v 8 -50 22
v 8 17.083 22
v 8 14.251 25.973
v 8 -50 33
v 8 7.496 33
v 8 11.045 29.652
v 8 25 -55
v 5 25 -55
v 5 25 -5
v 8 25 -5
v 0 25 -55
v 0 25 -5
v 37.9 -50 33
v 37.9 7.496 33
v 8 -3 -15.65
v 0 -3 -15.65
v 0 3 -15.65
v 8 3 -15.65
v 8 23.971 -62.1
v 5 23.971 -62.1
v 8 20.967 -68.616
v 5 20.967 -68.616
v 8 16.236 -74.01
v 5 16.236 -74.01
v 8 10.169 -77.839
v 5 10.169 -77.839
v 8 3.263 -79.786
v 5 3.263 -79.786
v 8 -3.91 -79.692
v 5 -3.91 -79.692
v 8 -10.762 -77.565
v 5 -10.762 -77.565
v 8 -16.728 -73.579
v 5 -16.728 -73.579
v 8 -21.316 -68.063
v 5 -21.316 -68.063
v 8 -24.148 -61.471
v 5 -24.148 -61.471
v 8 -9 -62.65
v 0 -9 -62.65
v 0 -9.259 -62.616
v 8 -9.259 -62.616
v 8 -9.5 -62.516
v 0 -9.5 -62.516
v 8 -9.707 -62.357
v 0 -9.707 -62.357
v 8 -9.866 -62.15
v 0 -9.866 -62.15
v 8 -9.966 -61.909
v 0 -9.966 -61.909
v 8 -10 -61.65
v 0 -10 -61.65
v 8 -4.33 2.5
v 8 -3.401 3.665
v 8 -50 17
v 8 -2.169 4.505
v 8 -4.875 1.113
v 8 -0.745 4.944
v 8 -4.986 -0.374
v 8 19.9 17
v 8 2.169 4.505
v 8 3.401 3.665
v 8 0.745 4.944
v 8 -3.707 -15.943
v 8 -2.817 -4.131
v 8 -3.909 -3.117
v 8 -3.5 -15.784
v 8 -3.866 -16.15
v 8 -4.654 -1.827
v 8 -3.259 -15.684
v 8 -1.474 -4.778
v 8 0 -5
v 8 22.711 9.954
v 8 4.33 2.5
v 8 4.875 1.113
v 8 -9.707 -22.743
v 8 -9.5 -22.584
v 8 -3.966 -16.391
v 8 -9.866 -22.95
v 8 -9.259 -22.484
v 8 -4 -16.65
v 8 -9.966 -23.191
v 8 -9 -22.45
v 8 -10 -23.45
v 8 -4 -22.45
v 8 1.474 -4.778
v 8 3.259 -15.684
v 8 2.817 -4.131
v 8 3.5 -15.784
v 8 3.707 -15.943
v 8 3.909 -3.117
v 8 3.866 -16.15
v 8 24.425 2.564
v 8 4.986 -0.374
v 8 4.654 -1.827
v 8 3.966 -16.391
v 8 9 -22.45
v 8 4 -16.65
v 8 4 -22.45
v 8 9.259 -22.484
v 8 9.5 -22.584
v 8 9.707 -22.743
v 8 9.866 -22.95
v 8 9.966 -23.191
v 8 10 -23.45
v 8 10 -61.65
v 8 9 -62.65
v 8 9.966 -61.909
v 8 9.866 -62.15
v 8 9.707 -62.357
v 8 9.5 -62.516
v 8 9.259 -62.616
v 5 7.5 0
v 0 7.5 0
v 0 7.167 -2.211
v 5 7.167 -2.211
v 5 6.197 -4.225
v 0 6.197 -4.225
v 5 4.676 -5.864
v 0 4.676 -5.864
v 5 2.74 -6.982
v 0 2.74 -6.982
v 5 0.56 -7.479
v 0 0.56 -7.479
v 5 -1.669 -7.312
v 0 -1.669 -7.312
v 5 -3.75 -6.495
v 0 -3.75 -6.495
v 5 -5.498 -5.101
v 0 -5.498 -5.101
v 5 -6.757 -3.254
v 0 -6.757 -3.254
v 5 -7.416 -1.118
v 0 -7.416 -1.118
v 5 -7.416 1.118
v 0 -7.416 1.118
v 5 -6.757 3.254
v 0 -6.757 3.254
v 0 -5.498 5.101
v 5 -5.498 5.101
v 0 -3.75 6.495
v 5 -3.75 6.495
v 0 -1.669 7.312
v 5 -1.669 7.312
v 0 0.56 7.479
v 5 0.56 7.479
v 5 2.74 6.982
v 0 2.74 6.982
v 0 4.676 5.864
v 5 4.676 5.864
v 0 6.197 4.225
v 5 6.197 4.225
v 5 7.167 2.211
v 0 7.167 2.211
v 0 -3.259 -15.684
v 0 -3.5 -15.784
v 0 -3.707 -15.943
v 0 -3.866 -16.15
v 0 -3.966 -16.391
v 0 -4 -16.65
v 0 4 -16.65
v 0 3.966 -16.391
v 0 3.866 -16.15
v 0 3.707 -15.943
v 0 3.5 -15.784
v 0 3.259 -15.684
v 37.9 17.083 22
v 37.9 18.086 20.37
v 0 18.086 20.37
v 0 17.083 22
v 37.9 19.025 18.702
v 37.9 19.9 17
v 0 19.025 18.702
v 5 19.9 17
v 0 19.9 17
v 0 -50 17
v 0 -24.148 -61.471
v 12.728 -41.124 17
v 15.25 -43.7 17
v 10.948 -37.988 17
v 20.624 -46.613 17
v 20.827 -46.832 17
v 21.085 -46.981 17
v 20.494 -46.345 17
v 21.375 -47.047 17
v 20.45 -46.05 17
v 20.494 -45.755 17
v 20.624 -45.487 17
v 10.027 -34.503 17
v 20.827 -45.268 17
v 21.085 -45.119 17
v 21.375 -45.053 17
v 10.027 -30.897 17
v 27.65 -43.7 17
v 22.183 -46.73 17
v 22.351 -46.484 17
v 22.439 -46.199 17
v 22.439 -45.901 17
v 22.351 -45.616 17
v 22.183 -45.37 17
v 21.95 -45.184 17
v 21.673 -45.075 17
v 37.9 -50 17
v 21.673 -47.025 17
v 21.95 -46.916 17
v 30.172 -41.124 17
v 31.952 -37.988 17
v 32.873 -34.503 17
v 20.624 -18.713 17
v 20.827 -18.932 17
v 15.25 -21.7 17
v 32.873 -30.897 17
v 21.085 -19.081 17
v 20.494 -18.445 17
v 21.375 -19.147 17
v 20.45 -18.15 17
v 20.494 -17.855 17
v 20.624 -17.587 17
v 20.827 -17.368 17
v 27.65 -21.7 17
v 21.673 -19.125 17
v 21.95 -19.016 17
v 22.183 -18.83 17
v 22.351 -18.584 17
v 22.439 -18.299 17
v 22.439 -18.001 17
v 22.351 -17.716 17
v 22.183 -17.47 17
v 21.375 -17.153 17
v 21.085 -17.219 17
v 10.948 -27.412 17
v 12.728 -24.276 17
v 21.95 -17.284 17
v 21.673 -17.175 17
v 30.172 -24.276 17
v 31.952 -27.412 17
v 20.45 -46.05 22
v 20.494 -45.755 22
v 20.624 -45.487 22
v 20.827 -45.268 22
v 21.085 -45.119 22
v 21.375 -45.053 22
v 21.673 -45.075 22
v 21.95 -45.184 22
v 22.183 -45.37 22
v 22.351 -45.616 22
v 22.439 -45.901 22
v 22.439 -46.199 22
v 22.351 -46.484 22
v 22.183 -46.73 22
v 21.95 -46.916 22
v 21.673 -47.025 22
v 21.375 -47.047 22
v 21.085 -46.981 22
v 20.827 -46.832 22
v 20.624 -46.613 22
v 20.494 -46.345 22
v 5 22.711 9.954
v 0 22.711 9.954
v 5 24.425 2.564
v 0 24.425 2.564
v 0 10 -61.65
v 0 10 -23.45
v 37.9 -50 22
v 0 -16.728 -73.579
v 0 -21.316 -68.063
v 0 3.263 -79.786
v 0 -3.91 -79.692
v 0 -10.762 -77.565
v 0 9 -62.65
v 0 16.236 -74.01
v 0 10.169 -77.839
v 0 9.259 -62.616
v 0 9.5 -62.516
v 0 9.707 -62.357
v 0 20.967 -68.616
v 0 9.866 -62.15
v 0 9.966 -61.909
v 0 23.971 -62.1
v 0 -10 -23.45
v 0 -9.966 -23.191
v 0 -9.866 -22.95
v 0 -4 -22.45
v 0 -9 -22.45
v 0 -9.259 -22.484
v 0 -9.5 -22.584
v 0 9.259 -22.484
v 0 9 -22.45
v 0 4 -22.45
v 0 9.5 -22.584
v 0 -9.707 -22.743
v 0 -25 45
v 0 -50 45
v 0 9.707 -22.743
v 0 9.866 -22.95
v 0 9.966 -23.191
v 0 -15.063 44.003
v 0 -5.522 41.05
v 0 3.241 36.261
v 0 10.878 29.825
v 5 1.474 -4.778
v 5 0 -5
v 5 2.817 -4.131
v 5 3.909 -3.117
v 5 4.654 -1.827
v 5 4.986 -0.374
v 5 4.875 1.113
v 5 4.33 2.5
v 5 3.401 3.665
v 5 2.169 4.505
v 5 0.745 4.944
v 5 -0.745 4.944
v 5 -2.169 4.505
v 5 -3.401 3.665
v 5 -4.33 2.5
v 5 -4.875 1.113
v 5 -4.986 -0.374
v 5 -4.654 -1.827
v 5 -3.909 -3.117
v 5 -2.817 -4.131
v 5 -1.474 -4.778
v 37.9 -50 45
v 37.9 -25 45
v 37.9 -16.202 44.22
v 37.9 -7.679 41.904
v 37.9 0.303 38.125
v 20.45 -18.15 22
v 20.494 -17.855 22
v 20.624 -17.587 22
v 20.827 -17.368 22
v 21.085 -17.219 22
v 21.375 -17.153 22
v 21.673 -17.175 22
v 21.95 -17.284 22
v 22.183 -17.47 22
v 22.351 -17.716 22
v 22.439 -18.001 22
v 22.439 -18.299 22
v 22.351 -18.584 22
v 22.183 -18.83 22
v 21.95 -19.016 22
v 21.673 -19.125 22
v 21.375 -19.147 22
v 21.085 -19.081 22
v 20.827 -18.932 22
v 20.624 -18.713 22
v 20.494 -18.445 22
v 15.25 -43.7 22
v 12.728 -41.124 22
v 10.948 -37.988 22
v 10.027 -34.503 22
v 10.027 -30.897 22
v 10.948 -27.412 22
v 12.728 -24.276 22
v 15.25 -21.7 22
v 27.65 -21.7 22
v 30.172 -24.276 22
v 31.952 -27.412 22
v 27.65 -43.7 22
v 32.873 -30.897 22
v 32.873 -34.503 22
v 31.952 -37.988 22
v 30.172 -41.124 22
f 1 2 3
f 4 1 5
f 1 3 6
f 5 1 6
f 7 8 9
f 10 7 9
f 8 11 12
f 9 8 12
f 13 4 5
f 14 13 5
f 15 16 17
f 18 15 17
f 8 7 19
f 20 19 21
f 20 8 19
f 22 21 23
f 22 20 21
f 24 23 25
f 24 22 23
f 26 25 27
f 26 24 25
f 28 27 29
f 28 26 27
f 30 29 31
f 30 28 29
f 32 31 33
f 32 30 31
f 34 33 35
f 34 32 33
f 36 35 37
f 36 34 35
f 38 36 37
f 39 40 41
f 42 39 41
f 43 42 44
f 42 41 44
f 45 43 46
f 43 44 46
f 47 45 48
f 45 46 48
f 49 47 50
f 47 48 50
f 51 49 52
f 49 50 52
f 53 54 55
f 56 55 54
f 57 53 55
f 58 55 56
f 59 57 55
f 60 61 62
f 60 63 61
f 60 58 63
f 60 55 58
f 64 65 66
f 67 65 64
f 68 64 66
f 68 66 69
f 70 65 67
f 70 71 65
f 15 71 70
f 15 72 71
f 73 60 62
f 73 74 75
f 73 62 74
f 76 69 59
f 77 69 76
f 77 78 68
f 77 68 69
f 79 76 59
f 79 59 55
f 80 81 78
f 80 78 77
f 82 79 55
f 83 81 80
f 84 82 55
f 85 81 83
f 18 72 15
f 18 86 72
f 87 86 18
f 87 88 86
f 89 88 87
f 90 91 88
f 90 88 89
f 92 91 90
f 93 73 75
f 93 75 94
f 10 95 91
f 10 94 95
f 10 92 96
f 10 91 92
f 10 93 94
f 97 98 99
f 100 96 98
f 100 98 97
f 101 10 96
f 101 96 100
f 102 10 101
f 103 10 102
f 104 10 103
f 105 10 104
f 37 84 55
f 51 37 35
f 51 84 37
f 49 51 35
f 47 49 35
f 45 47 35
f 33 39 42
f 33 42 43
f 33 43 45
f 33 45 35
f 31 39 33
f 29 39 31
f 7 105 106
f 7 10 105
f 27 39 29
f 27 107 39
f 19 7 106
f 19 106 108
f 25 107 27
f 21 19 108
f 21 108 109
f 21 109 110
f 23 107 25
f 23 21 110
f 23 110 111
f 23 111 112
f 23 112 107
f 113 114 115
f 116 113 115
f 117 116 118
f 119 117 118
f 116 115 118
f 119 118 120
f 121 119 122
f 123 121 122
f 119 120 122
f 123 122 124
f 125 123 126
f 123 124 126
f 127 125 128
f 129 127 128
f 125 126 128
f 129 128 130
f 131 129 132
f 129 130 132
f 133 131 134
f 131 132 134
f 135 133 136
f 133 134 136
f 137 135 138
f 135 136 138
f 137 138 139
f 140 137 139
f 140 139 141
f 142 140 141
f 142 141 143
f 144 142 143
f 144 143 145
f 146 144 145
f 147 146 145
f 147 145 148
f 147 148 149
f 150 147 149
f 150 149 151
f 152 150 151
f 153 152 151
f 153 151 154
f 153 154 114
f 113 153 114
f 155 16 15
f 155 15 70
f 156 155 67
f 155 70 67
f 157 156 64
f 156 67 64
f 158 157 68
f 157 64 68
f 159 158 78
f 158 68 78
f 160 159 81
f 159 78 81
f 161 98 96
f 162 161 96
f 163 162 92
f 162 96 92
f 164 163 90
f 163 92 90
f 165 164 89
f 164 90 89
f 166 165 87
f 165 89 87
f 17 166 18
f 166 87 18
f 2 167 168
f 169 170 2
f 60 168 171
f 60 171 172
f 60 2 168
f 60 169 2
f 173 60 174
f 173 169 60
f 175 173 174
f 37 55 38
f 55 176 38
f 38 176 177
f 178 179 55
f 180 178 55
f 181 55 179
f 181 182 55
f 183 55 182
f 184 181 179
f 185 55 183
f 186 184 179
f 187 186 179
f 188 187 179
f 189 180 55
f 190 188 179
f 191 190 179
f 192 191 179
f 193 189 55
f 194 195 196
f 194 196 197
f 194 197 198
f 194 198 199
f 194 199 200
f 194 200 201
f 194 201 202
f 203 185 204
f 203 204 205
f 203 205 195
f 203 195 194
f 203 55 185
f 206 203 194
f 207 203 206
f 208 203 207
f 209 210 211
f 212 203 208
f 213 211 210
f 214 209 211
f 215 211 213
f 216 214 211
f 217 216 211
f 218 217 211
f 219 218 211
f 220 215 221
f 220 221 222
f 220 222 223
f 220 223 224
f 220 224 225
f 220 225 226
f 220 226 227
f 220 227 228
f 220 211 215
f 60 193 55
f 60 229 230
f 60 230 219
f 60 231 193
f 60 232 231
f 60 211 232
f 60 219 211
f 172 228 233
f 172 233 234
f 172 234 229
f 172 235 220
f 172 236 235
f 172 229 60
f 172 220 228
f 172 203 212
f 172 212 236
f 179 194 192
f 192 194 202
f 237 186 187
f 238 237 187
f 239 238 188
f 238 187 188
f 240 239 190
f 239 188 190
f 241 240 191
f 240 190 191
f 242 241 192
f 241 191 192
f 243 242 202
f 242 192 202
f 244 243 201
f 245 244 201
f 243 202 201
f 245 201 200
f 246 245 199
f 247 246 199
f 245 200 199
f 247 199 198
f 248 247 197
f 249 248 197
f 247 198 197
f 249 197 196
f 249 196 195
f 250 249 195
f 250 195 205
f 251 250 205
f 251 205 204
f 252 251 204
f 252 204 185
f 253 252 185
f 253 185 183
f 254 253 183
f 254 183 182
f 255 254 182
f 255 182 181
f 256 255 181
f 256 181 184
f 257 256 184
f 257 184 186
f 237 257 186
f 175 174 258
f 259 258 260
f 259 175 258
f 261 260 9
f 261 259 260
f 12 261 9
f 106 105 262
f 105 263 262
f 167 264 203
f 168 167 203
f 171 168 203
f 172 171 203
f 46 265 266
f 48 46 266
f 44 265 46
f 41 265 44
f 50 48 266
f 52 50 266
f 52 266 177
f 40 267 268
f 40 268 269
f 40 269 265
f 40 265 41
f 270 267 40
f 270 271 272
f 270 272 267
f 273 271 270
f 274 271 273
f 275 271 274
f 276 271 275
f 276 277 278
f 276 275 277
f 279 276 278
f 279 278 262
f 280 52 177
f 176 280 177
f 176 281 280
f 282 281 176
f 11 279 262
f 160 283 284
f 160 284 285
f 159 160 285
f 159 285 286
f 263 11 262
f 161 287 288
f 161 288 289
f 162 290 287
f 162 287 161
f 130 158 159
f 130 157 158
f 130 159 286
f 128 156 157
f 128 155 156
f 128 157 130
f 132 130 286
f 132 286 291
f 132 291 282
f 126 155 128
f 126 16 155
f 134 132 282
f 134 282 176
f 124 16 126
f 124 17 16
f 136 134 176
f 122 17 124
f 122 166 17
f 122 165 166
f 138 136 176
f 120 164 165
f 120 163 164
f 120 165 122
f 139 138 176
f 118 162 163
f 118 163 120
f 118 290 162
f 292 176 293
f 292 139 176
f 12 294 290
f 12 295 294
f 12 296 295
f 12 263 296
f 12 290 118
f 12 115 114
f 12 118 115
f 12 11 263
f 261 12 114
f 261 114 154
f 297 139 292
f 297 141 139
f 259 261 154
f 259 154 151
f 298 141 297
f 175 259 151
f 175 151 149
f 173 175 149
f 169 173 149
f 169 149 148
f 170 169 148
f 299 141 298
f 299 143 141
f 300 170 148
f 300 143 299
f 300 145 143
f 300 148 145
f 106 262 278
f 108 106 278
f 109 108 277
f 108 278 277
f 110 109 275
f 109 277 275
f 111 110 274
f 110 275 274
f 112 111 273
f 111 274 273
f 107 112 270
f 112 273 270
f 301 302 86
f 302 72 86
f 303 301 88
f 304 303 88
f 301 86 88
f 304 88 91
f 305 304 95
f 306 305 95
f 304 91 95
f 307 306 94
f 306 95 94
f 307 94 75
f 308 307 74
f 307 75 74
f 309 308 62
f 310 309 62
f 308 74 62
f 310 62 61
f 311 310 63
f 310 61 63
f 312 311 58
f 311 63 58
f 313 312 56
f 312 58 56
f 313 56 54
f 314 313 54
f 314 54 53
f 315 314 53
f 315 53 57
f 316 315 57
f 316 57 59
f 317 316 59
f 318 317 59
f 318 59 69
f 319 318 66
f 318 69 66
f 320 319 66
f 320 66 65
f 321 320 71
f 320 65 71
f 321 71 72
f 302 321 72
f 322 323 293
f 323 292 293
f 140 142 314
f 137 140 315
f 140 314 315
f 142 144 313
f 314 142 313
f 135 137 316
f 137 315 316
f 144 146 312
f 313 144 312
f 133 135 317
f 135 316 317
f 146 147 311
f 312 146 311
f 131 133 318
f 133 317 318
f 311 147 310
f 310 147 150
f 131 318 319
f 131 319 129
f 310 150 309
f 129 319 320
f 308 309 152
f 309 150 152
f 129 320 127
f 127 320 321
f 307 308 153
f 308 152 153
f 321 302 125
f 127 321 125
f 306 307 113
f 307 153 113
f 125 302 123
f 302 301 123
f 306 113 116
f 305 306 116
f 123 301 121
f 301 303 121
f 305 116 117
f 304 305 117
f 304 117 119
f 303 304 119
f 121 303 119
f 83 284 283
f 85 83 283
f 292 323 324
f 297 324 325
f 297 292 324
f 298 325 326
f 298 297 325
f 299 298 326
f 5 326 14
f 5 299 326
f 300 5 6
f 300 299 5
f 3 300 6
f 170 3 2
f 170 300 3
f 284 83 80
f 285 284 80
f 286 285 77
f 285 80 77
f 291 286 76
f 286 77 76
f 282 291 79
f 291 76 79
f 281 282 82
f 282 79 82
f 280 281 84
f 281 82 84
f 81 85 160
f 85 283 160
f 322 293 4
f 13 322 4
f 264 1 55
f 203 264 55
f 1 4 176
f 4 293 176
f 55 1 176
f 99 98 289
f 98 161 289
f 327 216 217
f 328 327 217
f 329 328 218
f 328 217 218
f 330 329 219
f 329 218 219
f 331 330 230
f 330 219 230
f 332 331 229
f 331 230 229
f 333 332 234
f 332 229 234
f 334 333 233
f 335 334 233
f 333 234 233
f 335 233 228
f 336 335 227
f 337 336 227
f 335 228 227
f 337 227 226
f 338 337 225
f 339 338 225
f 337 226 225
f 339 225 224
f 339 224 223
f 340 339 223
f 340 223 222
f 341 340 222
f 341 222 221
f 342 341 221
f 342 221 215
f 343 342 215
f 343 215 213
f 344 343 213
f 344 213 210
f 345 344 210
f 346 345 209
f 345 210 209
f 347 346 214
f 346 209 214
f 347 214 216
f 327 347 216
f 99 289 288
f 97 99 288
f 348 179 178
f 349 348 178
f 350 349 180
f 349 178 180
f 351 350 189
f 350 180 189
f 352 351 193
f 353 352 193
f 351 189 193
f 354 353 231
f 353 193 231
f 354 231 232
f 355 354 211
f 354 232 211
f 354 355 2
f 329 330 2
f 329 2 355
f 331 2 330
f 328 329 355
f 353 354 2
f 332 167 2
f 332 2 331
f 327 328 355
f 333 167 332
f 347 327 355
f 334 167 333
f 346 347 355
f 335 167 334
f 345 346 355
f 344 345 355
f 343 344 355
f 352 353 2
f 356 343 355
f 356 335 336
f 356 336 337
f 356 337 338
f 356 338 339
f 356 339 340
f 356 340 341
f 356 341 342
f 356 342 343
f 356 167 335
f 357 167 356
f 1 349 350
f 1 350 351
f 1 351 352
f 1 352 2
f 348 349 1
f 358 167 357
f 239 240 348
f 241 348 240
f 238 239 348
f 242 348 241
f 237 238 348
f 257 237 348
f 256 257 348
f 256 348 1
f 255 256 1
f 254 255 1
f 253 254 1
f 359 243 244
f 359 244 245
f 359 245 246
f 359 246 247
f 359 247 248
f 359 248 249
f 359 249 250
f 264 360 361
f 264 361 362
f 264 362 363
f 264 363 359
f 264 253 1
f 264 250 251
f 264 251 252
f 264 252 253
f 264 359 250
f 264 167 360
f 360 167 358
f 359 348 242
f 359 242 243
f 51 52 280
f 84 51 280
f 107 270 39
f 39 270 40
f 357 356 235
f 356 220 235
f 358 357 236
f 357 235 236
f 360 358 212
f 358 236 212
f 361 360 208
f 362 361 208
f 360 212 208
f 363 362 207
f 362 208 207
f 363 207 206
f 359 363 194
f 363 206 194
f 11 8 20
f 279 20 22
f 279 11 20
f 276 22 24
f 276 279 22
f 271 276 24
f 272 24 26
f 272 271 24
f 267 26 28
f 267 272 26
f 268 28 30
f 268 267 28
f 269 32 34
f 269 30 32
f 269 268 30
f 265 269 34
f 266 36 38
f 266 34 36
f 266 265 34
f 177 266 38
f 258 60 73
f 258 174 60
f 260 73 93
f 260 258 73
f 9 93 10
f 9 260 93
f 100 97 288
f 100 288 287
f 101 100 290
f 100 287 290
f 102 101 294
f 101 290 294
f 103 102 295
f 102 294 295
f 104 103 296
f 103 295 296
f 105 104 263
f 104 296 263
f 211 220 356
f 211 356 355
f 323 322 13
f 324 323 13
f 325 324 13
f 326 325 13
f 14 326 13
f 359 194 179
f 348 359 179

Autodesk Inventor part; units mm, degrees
ref_plane "YZ Plane" through (0, 0, 0) normal (1, 0, 0) x (0, 1, 0)
ref_plane "XZ Plane" through (0, 0, 0) normal (0, 1, 0) x (-1, 0, 0)
ref_plane "XY Plane" through (0, 0, 0) normal (0, 0, 1) x (1, 0, 0)
sketch "Sketch1" plane through (0, 0, 0) normal (1, 0, 0) x (0, 1, 0)
  circle A0 centre (0, 0) radius 16.575
  line L0 (0, 16.575) -> (0, -49.725)
  line L1 (0, -33.15) -> (0, -15.05)
  line L2 (0, -15.05) -> (0, -70.05)
  line L3 (10, -70.05) -> (-10, -70.05)
  line L4 (-10, -70.05) -> (-10, -15.05)
  line L5 (-10, -15.05) -> (10, -15.05)
  line L6 (10, -15.05) -> (10, -70.05)
  line L7 (10, -70.05) -> (-10, -15.05) construction
  line L8 (-10, -70.05) -> (10, -15.05) construction
  line L9 (10, -62.65) -> (-10, -62.65)
  line L10 (-10, -62.65) -> (-10, -22.45)
  line L11 (-10, -22.45) -> (10, -22.45)
  line L12 (10, -22.45) -> (10, -62.65)
  line L13 (10, -62.65) -> (-10, -22.45) construction
  line L14 (-10, -62.65) -> (10, -22.45) construction
  line L15 (-4.95, -27.2) -> (-4.95, -17.7)
  line L16 (-4.95, -17.7) -> (4.95, -17.7)
  line L17 (4.95, -27.2) -> (-4.95, -17.7) construction
  line L18 (-4.95, -27.2) -> (4.95, -17.7) construction
  line L19 (4.95, -67.4) -> (-4.95, -67.4)
  line L20 (-4.95, -67.4) -> (-4.95, -57.9)
  line L21 (-4.95, -57.9) -> (4.95, -57.9)
  line L22 (4.95, -67.4) -> (-4.95, -57.9) construction
  line L23 (-4.95, -67.4) -> (4.95, -57.9) construction
  circle A1 centre (4.95, -17.7) radius 1.5
  circle A2 centre (-4.95, -17.7) radius 1.5
  circle A3 centre (4.95, -67.4) radius 1.5
  circle A4 centre (-4.95, -67.4) radius 1.5
  circle A5 centre (0, -33.15) radius 6.8
  line L24 (0, -80) -> (0, -55)
  arc A6 (-25, -55) -> (25, -55) centre (0, -55) ccw
  line L25 (0, 0) -> (0, 45)
  line L26 (25, 45) -> (-25, 45)
  line L27 (25, 45) -> (25, -55)
  line L28 (-25, 45) -> (-25, -55)
  circle A7 centre (0, 0) radius 7.5
  point P0 (0, -42.55)
  point P1 (0, -42.55)
  point P2 (0, -22.45)
  point P3 (0, -62.65)
  dimension "d0" = 33.15
  dimension "d2" = 66.3
  dimension "d4" = 18.1
  dimension "d5" = 55
  dimension "d6" = 20
  dimension "d7" = 55
  dimension "d8" = 40.2
  dimension "d9" = 9.9
  dimension "d10" = 9.5
  dimension "d11" = 9.9
  dimension "d12" = 9.5
  dimension "d13" = 3
  dimension "d14" = 3
  dimension "d15" = 3
  dimension "d16" = 3
  dimension "d17" = 13.6
  dimension "d20" = 25
  dimension "d21" = 45
  dimension "d22" = 15
extrude "Extrusion1" add sketch "Sketch1" along normal blind 5 contours A0 L5 L0 A7 | A0 L25 L26 L27 A6 L24 L3 L6 L5 | L0 A7 L5 A0 | A0 L5 L4 L3 L24 A6 L28 L26 L25 | L5 L6 L11 L0 A0 | A0 L0 L5 | L5 L0 A0 | A0 L0 L16 A2 L15 L11 L4 L5 | L0 L11 L15 A2 L16 | L6 L9 L2 L0 A5 L11 | L11 L0 A5 L2 L21 L20 L9 L4 | L6 L3 L2 L9 | L9 L20 A4 L19 L2 L3 L4 | L9 L20 L21 L2 | L2 L19 A4 L20 L9
sketch "Sketch2" plane through (5, 0, 0) normal (1, 0, 0) x (0, 0, -1)
  line L0 (-45, -25) -> (55, -25) projected
  circle A0 centre (33.15, 0) radius 6.8 projected
  line L1 (33.15, 0) -> (15.05, 0)
  line L2 (15.05, 0) -> (70.05, 0)
  line L3 (62.65, 10) -> (22.45, 10)
  line L4 (22.45, 10) -> (22.45, -10)
  line L5 (22.45, -10) -> (62.65, -10)
  line L6 (62.65, -10) -> (62.65, 10)
  line L7 (62.65, 10) -> (22.45, -10) construction
  line L8 (22.45, 10) -> (62.65, -10) construction
  point P0 (42.55, 0)
  dimension "d25" = 18.1
  dimension "d26" = 55
  dimension "d27" = 40.2
  dimension "d28" = 20
extrude "Extrusion2" cut sketch "Sketch2" against normal blind 5 contours L2 L6 L5 L4 L1 A0 | A0 L1 L4 L3 L6 L2
sketch "Sketch3" plane through (5, 0, 0) normal (1, 0, 0) x (0, 0, -1)
  circle A0 centre (17.7, 4.95) radius 1.5 projected
  circle A1 centre (17.7, -4.95) radius 1.5 projected
  circle A2 centre (67.4, 4.95) radius 1.5 projected
  circle A3 centre (67.4, -4.95) radius 1.5 projected
extrude "Extrusion3" add sketch "Sketch3" against normal blind 5
sketch "Sketch4" plane through (5, 0, 0) normal (1, 0, 0) x (0, 0, -1)
  line L0 (55, 25) -> (-45, 25) projected
  line L1 (-45, 25) -> (-45, -25) projected
  line L2 (-45, -25) -> (55, -25) projected
  line L3 (-45, 25) -> (-35, 25)
  line L4 (-35, 25) -> (-35, -25)
  line L5 (-35, -25) -> (-45, -25)
  line L6 (-45, -25) -> (-45, 25)
  dimension "d33" = 10
extrude "Extrusion4" add sketch "Sketch4" along normal blind 32.9
sketch "Sketch5" plane through (0, -25, -55) normal (0, -1, 0) x (1, 0, 0)
  line L0 (5, 90) -> (37.9, 90)
  line L1 (37.9, 90) -> (37.9, 100)
  line L2 (37.9, 100) -> (5, 100)
  line L3 (5, 100) -> (5, 90)
  point P0 (0, 55)
extrude "Extrusion5" add sketch "Sketch5" along normal blind 25
sketch "Sketch6" plane through (0, 0, 0) normal (-1, 0, 0) x (0, 0, 1)
  arc A0 (-55, 25) -> (-55, -25) centre (-55, 0) ccw projected
  line L0 (45, -25) -> (-55, -25) projected
  line L1 (-55, 25) -> (45, 25) projected
  line L2 (45, -25) -> (45, -50)
  line L3 (45, -50) -> (35, -50)
  line L4 (35, -50) -> (-61.4711, -24.148)
  line L5 (-55, -25) -> (45, -25)
  arc A1 (-61.4711, -24.148) -> (-55, -25) centre (-55, 0) ccw
  dimension "d38" = 25
  dimension "d39" = 10
extrude "Extrusion6" add sketch "Sketch6" against normal blind 5
sketch "Sketch7" plane through (0, 25, 45) normal (0, 0, 1) x (1, 0, 0)
  line L0 (37.9, -75) -> (0, -75) projected
  line L1 (0, 0) -> (37.9, 0) projected
  line L2 (18.95, -75) -> (18.95, -62.5)
  circle A0 centre (18.95, -62.5) radius 7.5
  point P0 (0, -25)
  dimension "d42" = 12.5
  dimension "d43" = 15
extrude "Extrusion7" cut sketch "Sketch7" against normal blind 10
sketch "Sketch8" plane through (5, 0, 0) normal (1, 0, 0) x (0, 0, -1)
  line L0 (-35, 25) -> (-35, -50) projected
  line L1 (55, 25) -> (-35, 25) projected
  line L2 (-35, -50) -> (-35, 25)
  line L3 (-35, -50) -> (-17, -50)
  line L4 (-17, -50) -> (-17, 25)
  line L5 (-17, -50) -> (61.4711, -24.148)
  line L6 (-17, -50) -> (-22, -50)
  line L7 (-22, -50) -> (-22, 25)
  line L8 (-17, 25) -> (-22, 25)
  dimension "d46" = 18
  dimension "d47" = 5
extrude "Extrusion8" add sketch "Sketch8" along normal blind 32.9 contours L1 L4 L3 L7
sketch "Sketch9" plane through (0, 0, 0) normal (-1, 0, 0) x (0, 0, 1)
  line L0 (-61.4711, -24.148) -> (35, -50) projected
  arc A0 (-55, 25) -> (-61.4711, -24.148) centre (-55, 0) ccw projected
  line L1 (17, -50) -> (-61.4711, -24.148)
  line L2 (-61.4711, -24.148) -> (35, -50)
  line L3 (35, -50) -> (17, -50)
  line L4 (35, -50) -> (17, -50)
  line L5 (17, -50) -> (-61.4711, -24.148)
  line L6 (-61.4711, -24.148) -> (35, -50)
  point P0 (45, -50)
  dimension "d50" = 28
extrude "Extrusion9" add sketch "Sketch9" against normal blind 5
sketch "Sketch11" plane through (0, 25, 45) normal (0, 0, 1) x (1, 0, 0)
  circle A0 centre (18.95, -62.5) radius 7.5 projected
  point P0 (0, -25)
extrude "Extrusion10" add sketch "Sketch11" against normal blind 10
sketch "Sketch12" plane through (0, 25, 45) normal (0, 0, 1) x (1, 0, 0)
  line L0 (37.9, -75) -> (0, -75) projected
  line L1 (0, -75) -> (5, -75)
  line L2 (37.9, -75) -> (5, -75)
  line L3 (21.45, -75) -> (21.45, -62.5)
  circle A0 centre (21.45, -62.5) radius 6.8
  point P0 (0, -25)
  dimension "d55" = 5
  dimension "d56" = 12.5
  dimension "d57" = 13.6
extrude "Extrusion11" cut sketch "Sketch12" against normal blind 10
sketch "Sketch13" plane through (37.9, 25, 17) normal (0, 0, -1) x (-1, 0, 0)
  line L0 (32.9, -75) -> (0, -75) projected
  line L1 (16.45, -75) -> (16.45, -62.5)
  circle A0 centre (16.45, -62.5) radius 6.2
  line L2 (16.45, -62.5) -> (16.45, -50.3)
  circle A1 centre (16.45, -56.4) radius 3.1
  point P0 (37.9, -25)
  dimension "d60" = 12.5
  dimension "d61" = 12.4
  dimension "d62" = 12.2
  dimension "d63" = 6.2
extrude "Extrusion12" cut sketch "Sketch13" against normal blind 5
sketch "Sketch15" plane through (37.9, 25, 17) normal (0, 0, -1) x (-1, 0, 0)
  arc A0 (13.4271, -57.0869) -> (19.4729, -57.0869) centre (16.45, -62.5) ccw projected
  line L0 (32.9, -75) -> (0, -75) projected
  line L1 (16.45, -62.5) -> (16.45, -73.1)
  circle A1 centre (16.45, -73.1) radius 1
  line L2 (16.45, -62.5) -> (16.45, -41.1)
  circle A2 centre (16.45, -41.1) radius 1
  point P0 (37.9, -25)
  dimension "d66" = 10.6
  dimension "d67" = 2
  dimension "d68" = 21.4
  dimension "d69" = 2
extrude "Extrusion13" cut sketch "Sketch15" against normal blind 5
sketch "Sketch16" plane through (37.9, 25, 17) normal (0, 0, -1) x (-1, 0, 0)
  circle A0 centre (16.45, -73.1) radius 1 projected
  circle A1 centre (16.45, -41.1) radius 1 projected
  line L0 (32.9, -75) -> (0, -75) projected
  line L1 (16.45, -41.1) -> (16.45, -43.15)
  line L2 (16.45, -73.1) -> (16.45, -71.05)
  point P0 (37.9, -25)
  dimension "d72" = 2.05
  dimension "d73" = 2.05
extrude "Extrusion14" add sketch "Sketch16" against normal blind 5
sketch "Sketch17" plane through (37.9, 25, 17) normal (0, 0, -1) x (-1, 0, 0)
  arc A0 (13.4271, -57.0869) -> (19.4729, -57.0869) centre (16.45, -62.5) ccw projected
  line L0 (32.9, -75) -> (0, -75) projected
  line L1 (16.45, -62.5) -> (16.45, -41.1)
  line L2 (16.45, -41.1) -> (16.45, -43.15)
  circle A1 centre (16.45, -43.15) radius 1
  line L3 (16.45, -62.5) -> (16.45, -73.1)
  line L4 (16.45, -73.1) -> (16.45, -71.05)
  circle A2 centre (16.45, -71.05) radius 1
  point P0 (37.9, -25)
  dimension "d76" = 21.4
  dimension "d77" = 2.05
  dimension "d78" = 2
  dimension "d79" = 10.6
  dimension "d80" = 2.05
  dimension "d81" = 2
extrude "Extrusion15" cut sketch "Sketch17" against normal blind 5
sketch "Sketch18" plane through (0, 0, 0) normal (-1, 0, 0) x (0, 0, 1)
  line L0 (45, 25) -> (45, -50) projected
  line L1 (-55, 25) -> (45, 25) projected
  line L2 (45, 25) -> (45, -20)
  line L3 (45, 25) -> (0, 25)
  line L4 (0, 25) -> (-5, 25)
  line L5 (45, -20) -> (45, -25)
  arc A0 (45, -25) -> (-5, 25) centre (-5, -25) ccw
  dimension "d84" = 45
  dimension "d86" = 5
  dimension "d87" = 5
extrude "Extrusion16" cut sketch "Sketch18" against normal blind 39
sketch "Sketch19" plane through (37.9, -50, 17) normal (0, 0, -1) x (-1, 0, 0)
  line L0 (32.9, 0) -> (32.9, 69.8999) projected
  arc A0 (13.4271, 17.9131) -> (19.4729, 17.9131) centre (16.45, 12.5) ccw projected
  arc A1 (19.4729, 17.9131) -> (13.4271, 17.9131) centre (16.45, 18.6) ccw projected
  line L1 (0, 25) -> (0, 0) projected
  line L2 (0, 6.3) -> (32.9, 6.3)
  line L3 (0, 6.3) -> (0, 28.3)
  line L4 (0, 55) -> (0, 25) projected
  line L5 (0, 28.3) -> (32.9, 28.3)
  line L6 (32.9, 28.3) -> (32.9, 6.3)
  point P0 (37.9, 50)
  dimension "d90" = 22
extrude "Extrusion17" cut sketch "Sketch19" against normal blind 5
sketch "Sketch21" plane through (5, 0, 0) normal (1, 0, 0) x (0, 0, -1)
  line L0 (22.45, -10) -> (22.45, 10) projected
  line L1 (22.45, 10) -> (62.65, 10) projected
  line L2 (62.65, 10) -> (62.65, -10) projected
  line L3 (62.65, -10) -> (22.45, -10) projected
  circle A0 centre (0, 0) radius 7.5 projected
  arc A1 (-22, 17.0833) -> (-35, 5) centre (5, -25) ccw projected
  line L4 (-35, 5) -> (-35, -50) projected
  line L5 (-35, -50) -> (-22, -50) projected
  line L6 (-22, -43.7) -> (-22, -50) projected
  line L7 (-17, -43.7) -> (-22, -43.7) projected
  line L8 (-17, -50) -> (-17, -43.7) projected
  line L9 (-17, -50) -> (61.4711, -24.148) projected
  arc A2 (61.4711, -24.148) -> (55, 25) centre (55, 0) ccw projected
  line L10 (55, 25) -> (5, 25) projected
  arc A3 (5, 25) -> (-17, 19.8999) centre (5, -25) ccw projected
  line L11 (-17, -21.7) -> (-17, 19.8999) projected
  line L12 (-17, -21.7) -> (-22, -21.7) projected
  line L13 (-22, 17.0833) -> (-22, -21.7) projected
extrude "Extrusion18" add sketch "Sketch21" along normal blind 3
sketch "Sketch22" plane through (0, -50, 45) normal (0, 0, 1) x (1, 0, 0)
  circle A0 centre (21.45, 12.5) radius 6.8 projected
  circle A1 centre (21.45, 12.5) radius 5
  point P0 (0, 50)
  dimension "d95" = 10
extrude "Extrusion19" add sketch "Sketch22" against normal blind 2
sketch "Sketch23" plane through (37.9, -50, 35) normal (0, 0, -1) x (-1, 0, 0)
  circle A0 centre (16.45, 12.5) radius 6.8 projected
  line L0 (29.9, 0) -> (29.9, 55) projected
  line L1 (29.9, 55) -> (0, 55) projected
  line L2 (0, 55) -> (0, 0) projected
  line L3 (29.9, 0) -> (0, 0) projected
  point P0 (37.9, 50)
extrude "Extrusion20" add sketch "Sketch23" along normal blind 2
sketch "Sketch24" plane through (37.9, -21.7, 17) normal (0, -1, 0) x (1, 0, 0)
  line L0 (-29.9, 5) -> (0, 5) projected
  line L1 (0, 0) -> (-10.25, 0)
  line L2 (-10.25, 0) -> (-10.25, 5)
  line L3 (-10.25, 5) -> (0, 5)
  line L4 (0, 5) -> (0, 0)
  line L5 (-29.9, 0) -> (-22.65, 0)
  line L6 (-22.65, 0) -> (-22.65, 5)
  line L7 (-22.65, 5) -> (-29.9, 5)
  line L8 (-29.9, 5) -> (-29.9, 0)
  point P0 (-37.9, -17)
  dimension "d100" = 10.25
  dimension "d101" = 7.25
extrude "Extrusion21" add sketch "Sketch24" along normal blind 22
sketch "Sketch25" plane through (37.9, -50, 33) normal (0, 0, -1) x (-1, 0, 0)
  circle A0 centre (16.45, 12.5) radius 6.8 projected
  circle A1 centre (16.45, 12.5) radius 5
  point P0 (37.9, 50)
  dimension "d104" = 10
extrude "Extrusion22" add sketch "Sketch25" against normal blind 2
sketch "Sketch26" plane through (8, 0, 0) normal (1, 0, 0) x (0, 0, -1)
  circle A0 centre (0, 0) radius 7.5 projected
  circle A1 centre (0, 0) radius 5
  dimension "d107" = 10
extrude "Extrusion23" add sketch "Sketch26" against normal blind 3
sketch "Sketch28" plane through (37.9, -50, 17) normal (0, 0, -1) x (-1, 0, 0)
  line L0 (10.25, 28.3) -> (10.25, 6.3) projected
  line L1 (22.65, 28.3) -> (22.65, 6.3) projected
  arc A0 (22.65, 6.3) -> (22.65, 28.3) centre (13.9897, 17.3) ccw
  arc A1 (10.25, 28.3) -> (10.25, 6.3) centre (18.9103, 17.3) ccw
  point P0 (37.9, 50)
  dimension "d111" = 14
  dimension "d112" = 14
extrude "Extrusion24" cut sketch "Sketch28" against normal blind 5
sketch "Sketch29" plane through (37.9, 0, 0) normal (1, 0, 0) x (0, 0, -1)
  arc A0 (-35, 5) -> (-45, -25) centre (5, -25) ccw projected
  line L0 (-45, -25) -> (-45, -50) projected
  line L1 (-45, -50) -> (-33, -50) projected
  line L2 (-33, 5) -> (-33, -50) projected
  line L3 (-35, 5) -> (-33, 5) projected
  point P0 (0, 0)
extrude "Extrusion25" cut sketch "Sketch29" against normal blind 29.9
sketch "Sketch30" plane through (0, -50, -55) normal (0, -1, 0) x (1, 0, 0)
  line L0 (8, 100) -> (8, 77) projected
  line L1 (8, 100) -> (0, 100) projected
  line L2 (0, 72) -> (0, 100) projected
  line L3 (8, 77) -> (0, 77)
  point P0 (0, 55)
extrude "Extrusion26" cut sketch "Sketch30" against normal blind 70
sketch "Sketch31" plane through (37.9, 0, 0) normal (1, 0, 0) x (0, 0, -1)
  line L0 (-17, -50) -> (-17, 19.8999) projected
  arc A0 (-17, 19.8999) -> (-22, 17.0833) centre (5, -25) ccw projected
  line L1 (-17, -50) -> (-17, 18)
  line L2 (-17, 18) -> (-17, 20)
  line L3 (-17, 20) -> (-22, 20)
  line L4 (-22, 20) -> (-22, 17.0833)
  line L5 (-17, 19.8999) -> (-17, 20)
  point P0 (0, 0)
  dimension "d119" = 68
  dimension "d120" = 2
  dimension "d121" = 5
extrude "Extrusion27" add sketch "Sketch31" against normal blind 37.9
sketch "Sketch32" plane through (0, 0, 0) normal (-1, 0, 0) x (0, 0, 1)
  line L0 (22, 20) -> (17, 20) projected
  line L1 (17, 20) -> (17, 19.8999) projected
  line L2 (17, -50) -> (45, -50)
  line L3 (22, -50) -> (17, -50) projected
  line L4 (45, -50) -> (45, 20)
  line L5 (45, 20) -> (22, 20)
  line L6 (45, -50) -> (45, -25)
  arc A0 (45, -25) -> (17, 19.8999) centre (-5, -25) ccw
  dimension "d124" = 28
  dimension "d125" = 70
  dimension "d127" = 25
  dimension "d128" = 50
sketch "Sketch33" plane through (0, 0, 0) normal (-1, 0, 0) x (0, 0, 1)
  line L0 (22, -50) -> (22, 20) projected
  line L1 (17, -50) -> (22, -50) projected
  line L2 (45, -50) -> (45, -25)
  arc A0 (45, -25) -> (-5, 25) centre (-5, -25) ccw
  line L3 (22, -50) -> (45, -50)
  arc A1 (45, -25) -> (22, 17.0833) centre (-5, -25) ccw
  dimension "d126" = 25
extrude "Extrusion28" cut sketch "Sketch32" against normal blind 37.9
extrude "Extrusion29" add sketch "Sketch33" against normal blind 8
sketch "Sketch34" plane through (8, 0, 0) normal (1, 0, 0) x (0, 0, -1)
  line L0 (-45, -25) -> (-45, -50) projected
  line L1 (-45, -50) -> (-33, -50)
  line L2 (-17, -50) -> (-45, -50) projected
  line L3 (-33, -50) -> (-33, 7.4962)
  arc A0 (5, 25) -> (-45, -25) centre (5, -25) ccw projected
  point P0 (0, 0)
  dimension "d133" = 12
  dimension "d134" = 90
extrude "Extrusion30" add sketch "Sketch34" along normal blind 29.9
sketch "Sketch35" plane through (0, 0, 0) normal (-1, 0, 0) x (0, 0, 1)
  line L0 (-62.65, -10) -> (-62.65, 10) projected
  line L1 (-62.65, 10) -> (-22.45, 10) projected
  line L2 (-62.65, 0) -> (-15.65, 0)
  line L3 (-22.45, -10) -> (-22.45, 10) projected
  line L4 (-22.45, 0) -> (-15.65, 0)
  line L5 (-22.45, -4) -> (-15.65, -4)
  line L6 (-15.65, -4) -> (-15.65, 4)
  line L7 (-15.65, 4) -> (-22.45, 4)
  line L8 (-22.45, 4) -> (-22.45, -4)
  line L9 (-22.45, -4) -> (-15.65, 4) construction
  line L10 (-15.65, -4) -> (-22.45, 4) construction
  point P0 (-19.05, 0)
  dimension "d137" = 47
  dimension "d138" = 8
extrude "Extrusion31" cut sketch "Sketch35" against normal blind 8 contours L3 L7 L6 L2 | L2 L6 L5 L3
fillet "Fillet1" radius 1 6 edges at (4, -4, -15.65) (4, 4, -15.65) (4, 10, -22.45) (4, 10, -62.65) (4, -10, -62.65) (4, -10, -22.45)
properties part number "packa_strana(b)"
